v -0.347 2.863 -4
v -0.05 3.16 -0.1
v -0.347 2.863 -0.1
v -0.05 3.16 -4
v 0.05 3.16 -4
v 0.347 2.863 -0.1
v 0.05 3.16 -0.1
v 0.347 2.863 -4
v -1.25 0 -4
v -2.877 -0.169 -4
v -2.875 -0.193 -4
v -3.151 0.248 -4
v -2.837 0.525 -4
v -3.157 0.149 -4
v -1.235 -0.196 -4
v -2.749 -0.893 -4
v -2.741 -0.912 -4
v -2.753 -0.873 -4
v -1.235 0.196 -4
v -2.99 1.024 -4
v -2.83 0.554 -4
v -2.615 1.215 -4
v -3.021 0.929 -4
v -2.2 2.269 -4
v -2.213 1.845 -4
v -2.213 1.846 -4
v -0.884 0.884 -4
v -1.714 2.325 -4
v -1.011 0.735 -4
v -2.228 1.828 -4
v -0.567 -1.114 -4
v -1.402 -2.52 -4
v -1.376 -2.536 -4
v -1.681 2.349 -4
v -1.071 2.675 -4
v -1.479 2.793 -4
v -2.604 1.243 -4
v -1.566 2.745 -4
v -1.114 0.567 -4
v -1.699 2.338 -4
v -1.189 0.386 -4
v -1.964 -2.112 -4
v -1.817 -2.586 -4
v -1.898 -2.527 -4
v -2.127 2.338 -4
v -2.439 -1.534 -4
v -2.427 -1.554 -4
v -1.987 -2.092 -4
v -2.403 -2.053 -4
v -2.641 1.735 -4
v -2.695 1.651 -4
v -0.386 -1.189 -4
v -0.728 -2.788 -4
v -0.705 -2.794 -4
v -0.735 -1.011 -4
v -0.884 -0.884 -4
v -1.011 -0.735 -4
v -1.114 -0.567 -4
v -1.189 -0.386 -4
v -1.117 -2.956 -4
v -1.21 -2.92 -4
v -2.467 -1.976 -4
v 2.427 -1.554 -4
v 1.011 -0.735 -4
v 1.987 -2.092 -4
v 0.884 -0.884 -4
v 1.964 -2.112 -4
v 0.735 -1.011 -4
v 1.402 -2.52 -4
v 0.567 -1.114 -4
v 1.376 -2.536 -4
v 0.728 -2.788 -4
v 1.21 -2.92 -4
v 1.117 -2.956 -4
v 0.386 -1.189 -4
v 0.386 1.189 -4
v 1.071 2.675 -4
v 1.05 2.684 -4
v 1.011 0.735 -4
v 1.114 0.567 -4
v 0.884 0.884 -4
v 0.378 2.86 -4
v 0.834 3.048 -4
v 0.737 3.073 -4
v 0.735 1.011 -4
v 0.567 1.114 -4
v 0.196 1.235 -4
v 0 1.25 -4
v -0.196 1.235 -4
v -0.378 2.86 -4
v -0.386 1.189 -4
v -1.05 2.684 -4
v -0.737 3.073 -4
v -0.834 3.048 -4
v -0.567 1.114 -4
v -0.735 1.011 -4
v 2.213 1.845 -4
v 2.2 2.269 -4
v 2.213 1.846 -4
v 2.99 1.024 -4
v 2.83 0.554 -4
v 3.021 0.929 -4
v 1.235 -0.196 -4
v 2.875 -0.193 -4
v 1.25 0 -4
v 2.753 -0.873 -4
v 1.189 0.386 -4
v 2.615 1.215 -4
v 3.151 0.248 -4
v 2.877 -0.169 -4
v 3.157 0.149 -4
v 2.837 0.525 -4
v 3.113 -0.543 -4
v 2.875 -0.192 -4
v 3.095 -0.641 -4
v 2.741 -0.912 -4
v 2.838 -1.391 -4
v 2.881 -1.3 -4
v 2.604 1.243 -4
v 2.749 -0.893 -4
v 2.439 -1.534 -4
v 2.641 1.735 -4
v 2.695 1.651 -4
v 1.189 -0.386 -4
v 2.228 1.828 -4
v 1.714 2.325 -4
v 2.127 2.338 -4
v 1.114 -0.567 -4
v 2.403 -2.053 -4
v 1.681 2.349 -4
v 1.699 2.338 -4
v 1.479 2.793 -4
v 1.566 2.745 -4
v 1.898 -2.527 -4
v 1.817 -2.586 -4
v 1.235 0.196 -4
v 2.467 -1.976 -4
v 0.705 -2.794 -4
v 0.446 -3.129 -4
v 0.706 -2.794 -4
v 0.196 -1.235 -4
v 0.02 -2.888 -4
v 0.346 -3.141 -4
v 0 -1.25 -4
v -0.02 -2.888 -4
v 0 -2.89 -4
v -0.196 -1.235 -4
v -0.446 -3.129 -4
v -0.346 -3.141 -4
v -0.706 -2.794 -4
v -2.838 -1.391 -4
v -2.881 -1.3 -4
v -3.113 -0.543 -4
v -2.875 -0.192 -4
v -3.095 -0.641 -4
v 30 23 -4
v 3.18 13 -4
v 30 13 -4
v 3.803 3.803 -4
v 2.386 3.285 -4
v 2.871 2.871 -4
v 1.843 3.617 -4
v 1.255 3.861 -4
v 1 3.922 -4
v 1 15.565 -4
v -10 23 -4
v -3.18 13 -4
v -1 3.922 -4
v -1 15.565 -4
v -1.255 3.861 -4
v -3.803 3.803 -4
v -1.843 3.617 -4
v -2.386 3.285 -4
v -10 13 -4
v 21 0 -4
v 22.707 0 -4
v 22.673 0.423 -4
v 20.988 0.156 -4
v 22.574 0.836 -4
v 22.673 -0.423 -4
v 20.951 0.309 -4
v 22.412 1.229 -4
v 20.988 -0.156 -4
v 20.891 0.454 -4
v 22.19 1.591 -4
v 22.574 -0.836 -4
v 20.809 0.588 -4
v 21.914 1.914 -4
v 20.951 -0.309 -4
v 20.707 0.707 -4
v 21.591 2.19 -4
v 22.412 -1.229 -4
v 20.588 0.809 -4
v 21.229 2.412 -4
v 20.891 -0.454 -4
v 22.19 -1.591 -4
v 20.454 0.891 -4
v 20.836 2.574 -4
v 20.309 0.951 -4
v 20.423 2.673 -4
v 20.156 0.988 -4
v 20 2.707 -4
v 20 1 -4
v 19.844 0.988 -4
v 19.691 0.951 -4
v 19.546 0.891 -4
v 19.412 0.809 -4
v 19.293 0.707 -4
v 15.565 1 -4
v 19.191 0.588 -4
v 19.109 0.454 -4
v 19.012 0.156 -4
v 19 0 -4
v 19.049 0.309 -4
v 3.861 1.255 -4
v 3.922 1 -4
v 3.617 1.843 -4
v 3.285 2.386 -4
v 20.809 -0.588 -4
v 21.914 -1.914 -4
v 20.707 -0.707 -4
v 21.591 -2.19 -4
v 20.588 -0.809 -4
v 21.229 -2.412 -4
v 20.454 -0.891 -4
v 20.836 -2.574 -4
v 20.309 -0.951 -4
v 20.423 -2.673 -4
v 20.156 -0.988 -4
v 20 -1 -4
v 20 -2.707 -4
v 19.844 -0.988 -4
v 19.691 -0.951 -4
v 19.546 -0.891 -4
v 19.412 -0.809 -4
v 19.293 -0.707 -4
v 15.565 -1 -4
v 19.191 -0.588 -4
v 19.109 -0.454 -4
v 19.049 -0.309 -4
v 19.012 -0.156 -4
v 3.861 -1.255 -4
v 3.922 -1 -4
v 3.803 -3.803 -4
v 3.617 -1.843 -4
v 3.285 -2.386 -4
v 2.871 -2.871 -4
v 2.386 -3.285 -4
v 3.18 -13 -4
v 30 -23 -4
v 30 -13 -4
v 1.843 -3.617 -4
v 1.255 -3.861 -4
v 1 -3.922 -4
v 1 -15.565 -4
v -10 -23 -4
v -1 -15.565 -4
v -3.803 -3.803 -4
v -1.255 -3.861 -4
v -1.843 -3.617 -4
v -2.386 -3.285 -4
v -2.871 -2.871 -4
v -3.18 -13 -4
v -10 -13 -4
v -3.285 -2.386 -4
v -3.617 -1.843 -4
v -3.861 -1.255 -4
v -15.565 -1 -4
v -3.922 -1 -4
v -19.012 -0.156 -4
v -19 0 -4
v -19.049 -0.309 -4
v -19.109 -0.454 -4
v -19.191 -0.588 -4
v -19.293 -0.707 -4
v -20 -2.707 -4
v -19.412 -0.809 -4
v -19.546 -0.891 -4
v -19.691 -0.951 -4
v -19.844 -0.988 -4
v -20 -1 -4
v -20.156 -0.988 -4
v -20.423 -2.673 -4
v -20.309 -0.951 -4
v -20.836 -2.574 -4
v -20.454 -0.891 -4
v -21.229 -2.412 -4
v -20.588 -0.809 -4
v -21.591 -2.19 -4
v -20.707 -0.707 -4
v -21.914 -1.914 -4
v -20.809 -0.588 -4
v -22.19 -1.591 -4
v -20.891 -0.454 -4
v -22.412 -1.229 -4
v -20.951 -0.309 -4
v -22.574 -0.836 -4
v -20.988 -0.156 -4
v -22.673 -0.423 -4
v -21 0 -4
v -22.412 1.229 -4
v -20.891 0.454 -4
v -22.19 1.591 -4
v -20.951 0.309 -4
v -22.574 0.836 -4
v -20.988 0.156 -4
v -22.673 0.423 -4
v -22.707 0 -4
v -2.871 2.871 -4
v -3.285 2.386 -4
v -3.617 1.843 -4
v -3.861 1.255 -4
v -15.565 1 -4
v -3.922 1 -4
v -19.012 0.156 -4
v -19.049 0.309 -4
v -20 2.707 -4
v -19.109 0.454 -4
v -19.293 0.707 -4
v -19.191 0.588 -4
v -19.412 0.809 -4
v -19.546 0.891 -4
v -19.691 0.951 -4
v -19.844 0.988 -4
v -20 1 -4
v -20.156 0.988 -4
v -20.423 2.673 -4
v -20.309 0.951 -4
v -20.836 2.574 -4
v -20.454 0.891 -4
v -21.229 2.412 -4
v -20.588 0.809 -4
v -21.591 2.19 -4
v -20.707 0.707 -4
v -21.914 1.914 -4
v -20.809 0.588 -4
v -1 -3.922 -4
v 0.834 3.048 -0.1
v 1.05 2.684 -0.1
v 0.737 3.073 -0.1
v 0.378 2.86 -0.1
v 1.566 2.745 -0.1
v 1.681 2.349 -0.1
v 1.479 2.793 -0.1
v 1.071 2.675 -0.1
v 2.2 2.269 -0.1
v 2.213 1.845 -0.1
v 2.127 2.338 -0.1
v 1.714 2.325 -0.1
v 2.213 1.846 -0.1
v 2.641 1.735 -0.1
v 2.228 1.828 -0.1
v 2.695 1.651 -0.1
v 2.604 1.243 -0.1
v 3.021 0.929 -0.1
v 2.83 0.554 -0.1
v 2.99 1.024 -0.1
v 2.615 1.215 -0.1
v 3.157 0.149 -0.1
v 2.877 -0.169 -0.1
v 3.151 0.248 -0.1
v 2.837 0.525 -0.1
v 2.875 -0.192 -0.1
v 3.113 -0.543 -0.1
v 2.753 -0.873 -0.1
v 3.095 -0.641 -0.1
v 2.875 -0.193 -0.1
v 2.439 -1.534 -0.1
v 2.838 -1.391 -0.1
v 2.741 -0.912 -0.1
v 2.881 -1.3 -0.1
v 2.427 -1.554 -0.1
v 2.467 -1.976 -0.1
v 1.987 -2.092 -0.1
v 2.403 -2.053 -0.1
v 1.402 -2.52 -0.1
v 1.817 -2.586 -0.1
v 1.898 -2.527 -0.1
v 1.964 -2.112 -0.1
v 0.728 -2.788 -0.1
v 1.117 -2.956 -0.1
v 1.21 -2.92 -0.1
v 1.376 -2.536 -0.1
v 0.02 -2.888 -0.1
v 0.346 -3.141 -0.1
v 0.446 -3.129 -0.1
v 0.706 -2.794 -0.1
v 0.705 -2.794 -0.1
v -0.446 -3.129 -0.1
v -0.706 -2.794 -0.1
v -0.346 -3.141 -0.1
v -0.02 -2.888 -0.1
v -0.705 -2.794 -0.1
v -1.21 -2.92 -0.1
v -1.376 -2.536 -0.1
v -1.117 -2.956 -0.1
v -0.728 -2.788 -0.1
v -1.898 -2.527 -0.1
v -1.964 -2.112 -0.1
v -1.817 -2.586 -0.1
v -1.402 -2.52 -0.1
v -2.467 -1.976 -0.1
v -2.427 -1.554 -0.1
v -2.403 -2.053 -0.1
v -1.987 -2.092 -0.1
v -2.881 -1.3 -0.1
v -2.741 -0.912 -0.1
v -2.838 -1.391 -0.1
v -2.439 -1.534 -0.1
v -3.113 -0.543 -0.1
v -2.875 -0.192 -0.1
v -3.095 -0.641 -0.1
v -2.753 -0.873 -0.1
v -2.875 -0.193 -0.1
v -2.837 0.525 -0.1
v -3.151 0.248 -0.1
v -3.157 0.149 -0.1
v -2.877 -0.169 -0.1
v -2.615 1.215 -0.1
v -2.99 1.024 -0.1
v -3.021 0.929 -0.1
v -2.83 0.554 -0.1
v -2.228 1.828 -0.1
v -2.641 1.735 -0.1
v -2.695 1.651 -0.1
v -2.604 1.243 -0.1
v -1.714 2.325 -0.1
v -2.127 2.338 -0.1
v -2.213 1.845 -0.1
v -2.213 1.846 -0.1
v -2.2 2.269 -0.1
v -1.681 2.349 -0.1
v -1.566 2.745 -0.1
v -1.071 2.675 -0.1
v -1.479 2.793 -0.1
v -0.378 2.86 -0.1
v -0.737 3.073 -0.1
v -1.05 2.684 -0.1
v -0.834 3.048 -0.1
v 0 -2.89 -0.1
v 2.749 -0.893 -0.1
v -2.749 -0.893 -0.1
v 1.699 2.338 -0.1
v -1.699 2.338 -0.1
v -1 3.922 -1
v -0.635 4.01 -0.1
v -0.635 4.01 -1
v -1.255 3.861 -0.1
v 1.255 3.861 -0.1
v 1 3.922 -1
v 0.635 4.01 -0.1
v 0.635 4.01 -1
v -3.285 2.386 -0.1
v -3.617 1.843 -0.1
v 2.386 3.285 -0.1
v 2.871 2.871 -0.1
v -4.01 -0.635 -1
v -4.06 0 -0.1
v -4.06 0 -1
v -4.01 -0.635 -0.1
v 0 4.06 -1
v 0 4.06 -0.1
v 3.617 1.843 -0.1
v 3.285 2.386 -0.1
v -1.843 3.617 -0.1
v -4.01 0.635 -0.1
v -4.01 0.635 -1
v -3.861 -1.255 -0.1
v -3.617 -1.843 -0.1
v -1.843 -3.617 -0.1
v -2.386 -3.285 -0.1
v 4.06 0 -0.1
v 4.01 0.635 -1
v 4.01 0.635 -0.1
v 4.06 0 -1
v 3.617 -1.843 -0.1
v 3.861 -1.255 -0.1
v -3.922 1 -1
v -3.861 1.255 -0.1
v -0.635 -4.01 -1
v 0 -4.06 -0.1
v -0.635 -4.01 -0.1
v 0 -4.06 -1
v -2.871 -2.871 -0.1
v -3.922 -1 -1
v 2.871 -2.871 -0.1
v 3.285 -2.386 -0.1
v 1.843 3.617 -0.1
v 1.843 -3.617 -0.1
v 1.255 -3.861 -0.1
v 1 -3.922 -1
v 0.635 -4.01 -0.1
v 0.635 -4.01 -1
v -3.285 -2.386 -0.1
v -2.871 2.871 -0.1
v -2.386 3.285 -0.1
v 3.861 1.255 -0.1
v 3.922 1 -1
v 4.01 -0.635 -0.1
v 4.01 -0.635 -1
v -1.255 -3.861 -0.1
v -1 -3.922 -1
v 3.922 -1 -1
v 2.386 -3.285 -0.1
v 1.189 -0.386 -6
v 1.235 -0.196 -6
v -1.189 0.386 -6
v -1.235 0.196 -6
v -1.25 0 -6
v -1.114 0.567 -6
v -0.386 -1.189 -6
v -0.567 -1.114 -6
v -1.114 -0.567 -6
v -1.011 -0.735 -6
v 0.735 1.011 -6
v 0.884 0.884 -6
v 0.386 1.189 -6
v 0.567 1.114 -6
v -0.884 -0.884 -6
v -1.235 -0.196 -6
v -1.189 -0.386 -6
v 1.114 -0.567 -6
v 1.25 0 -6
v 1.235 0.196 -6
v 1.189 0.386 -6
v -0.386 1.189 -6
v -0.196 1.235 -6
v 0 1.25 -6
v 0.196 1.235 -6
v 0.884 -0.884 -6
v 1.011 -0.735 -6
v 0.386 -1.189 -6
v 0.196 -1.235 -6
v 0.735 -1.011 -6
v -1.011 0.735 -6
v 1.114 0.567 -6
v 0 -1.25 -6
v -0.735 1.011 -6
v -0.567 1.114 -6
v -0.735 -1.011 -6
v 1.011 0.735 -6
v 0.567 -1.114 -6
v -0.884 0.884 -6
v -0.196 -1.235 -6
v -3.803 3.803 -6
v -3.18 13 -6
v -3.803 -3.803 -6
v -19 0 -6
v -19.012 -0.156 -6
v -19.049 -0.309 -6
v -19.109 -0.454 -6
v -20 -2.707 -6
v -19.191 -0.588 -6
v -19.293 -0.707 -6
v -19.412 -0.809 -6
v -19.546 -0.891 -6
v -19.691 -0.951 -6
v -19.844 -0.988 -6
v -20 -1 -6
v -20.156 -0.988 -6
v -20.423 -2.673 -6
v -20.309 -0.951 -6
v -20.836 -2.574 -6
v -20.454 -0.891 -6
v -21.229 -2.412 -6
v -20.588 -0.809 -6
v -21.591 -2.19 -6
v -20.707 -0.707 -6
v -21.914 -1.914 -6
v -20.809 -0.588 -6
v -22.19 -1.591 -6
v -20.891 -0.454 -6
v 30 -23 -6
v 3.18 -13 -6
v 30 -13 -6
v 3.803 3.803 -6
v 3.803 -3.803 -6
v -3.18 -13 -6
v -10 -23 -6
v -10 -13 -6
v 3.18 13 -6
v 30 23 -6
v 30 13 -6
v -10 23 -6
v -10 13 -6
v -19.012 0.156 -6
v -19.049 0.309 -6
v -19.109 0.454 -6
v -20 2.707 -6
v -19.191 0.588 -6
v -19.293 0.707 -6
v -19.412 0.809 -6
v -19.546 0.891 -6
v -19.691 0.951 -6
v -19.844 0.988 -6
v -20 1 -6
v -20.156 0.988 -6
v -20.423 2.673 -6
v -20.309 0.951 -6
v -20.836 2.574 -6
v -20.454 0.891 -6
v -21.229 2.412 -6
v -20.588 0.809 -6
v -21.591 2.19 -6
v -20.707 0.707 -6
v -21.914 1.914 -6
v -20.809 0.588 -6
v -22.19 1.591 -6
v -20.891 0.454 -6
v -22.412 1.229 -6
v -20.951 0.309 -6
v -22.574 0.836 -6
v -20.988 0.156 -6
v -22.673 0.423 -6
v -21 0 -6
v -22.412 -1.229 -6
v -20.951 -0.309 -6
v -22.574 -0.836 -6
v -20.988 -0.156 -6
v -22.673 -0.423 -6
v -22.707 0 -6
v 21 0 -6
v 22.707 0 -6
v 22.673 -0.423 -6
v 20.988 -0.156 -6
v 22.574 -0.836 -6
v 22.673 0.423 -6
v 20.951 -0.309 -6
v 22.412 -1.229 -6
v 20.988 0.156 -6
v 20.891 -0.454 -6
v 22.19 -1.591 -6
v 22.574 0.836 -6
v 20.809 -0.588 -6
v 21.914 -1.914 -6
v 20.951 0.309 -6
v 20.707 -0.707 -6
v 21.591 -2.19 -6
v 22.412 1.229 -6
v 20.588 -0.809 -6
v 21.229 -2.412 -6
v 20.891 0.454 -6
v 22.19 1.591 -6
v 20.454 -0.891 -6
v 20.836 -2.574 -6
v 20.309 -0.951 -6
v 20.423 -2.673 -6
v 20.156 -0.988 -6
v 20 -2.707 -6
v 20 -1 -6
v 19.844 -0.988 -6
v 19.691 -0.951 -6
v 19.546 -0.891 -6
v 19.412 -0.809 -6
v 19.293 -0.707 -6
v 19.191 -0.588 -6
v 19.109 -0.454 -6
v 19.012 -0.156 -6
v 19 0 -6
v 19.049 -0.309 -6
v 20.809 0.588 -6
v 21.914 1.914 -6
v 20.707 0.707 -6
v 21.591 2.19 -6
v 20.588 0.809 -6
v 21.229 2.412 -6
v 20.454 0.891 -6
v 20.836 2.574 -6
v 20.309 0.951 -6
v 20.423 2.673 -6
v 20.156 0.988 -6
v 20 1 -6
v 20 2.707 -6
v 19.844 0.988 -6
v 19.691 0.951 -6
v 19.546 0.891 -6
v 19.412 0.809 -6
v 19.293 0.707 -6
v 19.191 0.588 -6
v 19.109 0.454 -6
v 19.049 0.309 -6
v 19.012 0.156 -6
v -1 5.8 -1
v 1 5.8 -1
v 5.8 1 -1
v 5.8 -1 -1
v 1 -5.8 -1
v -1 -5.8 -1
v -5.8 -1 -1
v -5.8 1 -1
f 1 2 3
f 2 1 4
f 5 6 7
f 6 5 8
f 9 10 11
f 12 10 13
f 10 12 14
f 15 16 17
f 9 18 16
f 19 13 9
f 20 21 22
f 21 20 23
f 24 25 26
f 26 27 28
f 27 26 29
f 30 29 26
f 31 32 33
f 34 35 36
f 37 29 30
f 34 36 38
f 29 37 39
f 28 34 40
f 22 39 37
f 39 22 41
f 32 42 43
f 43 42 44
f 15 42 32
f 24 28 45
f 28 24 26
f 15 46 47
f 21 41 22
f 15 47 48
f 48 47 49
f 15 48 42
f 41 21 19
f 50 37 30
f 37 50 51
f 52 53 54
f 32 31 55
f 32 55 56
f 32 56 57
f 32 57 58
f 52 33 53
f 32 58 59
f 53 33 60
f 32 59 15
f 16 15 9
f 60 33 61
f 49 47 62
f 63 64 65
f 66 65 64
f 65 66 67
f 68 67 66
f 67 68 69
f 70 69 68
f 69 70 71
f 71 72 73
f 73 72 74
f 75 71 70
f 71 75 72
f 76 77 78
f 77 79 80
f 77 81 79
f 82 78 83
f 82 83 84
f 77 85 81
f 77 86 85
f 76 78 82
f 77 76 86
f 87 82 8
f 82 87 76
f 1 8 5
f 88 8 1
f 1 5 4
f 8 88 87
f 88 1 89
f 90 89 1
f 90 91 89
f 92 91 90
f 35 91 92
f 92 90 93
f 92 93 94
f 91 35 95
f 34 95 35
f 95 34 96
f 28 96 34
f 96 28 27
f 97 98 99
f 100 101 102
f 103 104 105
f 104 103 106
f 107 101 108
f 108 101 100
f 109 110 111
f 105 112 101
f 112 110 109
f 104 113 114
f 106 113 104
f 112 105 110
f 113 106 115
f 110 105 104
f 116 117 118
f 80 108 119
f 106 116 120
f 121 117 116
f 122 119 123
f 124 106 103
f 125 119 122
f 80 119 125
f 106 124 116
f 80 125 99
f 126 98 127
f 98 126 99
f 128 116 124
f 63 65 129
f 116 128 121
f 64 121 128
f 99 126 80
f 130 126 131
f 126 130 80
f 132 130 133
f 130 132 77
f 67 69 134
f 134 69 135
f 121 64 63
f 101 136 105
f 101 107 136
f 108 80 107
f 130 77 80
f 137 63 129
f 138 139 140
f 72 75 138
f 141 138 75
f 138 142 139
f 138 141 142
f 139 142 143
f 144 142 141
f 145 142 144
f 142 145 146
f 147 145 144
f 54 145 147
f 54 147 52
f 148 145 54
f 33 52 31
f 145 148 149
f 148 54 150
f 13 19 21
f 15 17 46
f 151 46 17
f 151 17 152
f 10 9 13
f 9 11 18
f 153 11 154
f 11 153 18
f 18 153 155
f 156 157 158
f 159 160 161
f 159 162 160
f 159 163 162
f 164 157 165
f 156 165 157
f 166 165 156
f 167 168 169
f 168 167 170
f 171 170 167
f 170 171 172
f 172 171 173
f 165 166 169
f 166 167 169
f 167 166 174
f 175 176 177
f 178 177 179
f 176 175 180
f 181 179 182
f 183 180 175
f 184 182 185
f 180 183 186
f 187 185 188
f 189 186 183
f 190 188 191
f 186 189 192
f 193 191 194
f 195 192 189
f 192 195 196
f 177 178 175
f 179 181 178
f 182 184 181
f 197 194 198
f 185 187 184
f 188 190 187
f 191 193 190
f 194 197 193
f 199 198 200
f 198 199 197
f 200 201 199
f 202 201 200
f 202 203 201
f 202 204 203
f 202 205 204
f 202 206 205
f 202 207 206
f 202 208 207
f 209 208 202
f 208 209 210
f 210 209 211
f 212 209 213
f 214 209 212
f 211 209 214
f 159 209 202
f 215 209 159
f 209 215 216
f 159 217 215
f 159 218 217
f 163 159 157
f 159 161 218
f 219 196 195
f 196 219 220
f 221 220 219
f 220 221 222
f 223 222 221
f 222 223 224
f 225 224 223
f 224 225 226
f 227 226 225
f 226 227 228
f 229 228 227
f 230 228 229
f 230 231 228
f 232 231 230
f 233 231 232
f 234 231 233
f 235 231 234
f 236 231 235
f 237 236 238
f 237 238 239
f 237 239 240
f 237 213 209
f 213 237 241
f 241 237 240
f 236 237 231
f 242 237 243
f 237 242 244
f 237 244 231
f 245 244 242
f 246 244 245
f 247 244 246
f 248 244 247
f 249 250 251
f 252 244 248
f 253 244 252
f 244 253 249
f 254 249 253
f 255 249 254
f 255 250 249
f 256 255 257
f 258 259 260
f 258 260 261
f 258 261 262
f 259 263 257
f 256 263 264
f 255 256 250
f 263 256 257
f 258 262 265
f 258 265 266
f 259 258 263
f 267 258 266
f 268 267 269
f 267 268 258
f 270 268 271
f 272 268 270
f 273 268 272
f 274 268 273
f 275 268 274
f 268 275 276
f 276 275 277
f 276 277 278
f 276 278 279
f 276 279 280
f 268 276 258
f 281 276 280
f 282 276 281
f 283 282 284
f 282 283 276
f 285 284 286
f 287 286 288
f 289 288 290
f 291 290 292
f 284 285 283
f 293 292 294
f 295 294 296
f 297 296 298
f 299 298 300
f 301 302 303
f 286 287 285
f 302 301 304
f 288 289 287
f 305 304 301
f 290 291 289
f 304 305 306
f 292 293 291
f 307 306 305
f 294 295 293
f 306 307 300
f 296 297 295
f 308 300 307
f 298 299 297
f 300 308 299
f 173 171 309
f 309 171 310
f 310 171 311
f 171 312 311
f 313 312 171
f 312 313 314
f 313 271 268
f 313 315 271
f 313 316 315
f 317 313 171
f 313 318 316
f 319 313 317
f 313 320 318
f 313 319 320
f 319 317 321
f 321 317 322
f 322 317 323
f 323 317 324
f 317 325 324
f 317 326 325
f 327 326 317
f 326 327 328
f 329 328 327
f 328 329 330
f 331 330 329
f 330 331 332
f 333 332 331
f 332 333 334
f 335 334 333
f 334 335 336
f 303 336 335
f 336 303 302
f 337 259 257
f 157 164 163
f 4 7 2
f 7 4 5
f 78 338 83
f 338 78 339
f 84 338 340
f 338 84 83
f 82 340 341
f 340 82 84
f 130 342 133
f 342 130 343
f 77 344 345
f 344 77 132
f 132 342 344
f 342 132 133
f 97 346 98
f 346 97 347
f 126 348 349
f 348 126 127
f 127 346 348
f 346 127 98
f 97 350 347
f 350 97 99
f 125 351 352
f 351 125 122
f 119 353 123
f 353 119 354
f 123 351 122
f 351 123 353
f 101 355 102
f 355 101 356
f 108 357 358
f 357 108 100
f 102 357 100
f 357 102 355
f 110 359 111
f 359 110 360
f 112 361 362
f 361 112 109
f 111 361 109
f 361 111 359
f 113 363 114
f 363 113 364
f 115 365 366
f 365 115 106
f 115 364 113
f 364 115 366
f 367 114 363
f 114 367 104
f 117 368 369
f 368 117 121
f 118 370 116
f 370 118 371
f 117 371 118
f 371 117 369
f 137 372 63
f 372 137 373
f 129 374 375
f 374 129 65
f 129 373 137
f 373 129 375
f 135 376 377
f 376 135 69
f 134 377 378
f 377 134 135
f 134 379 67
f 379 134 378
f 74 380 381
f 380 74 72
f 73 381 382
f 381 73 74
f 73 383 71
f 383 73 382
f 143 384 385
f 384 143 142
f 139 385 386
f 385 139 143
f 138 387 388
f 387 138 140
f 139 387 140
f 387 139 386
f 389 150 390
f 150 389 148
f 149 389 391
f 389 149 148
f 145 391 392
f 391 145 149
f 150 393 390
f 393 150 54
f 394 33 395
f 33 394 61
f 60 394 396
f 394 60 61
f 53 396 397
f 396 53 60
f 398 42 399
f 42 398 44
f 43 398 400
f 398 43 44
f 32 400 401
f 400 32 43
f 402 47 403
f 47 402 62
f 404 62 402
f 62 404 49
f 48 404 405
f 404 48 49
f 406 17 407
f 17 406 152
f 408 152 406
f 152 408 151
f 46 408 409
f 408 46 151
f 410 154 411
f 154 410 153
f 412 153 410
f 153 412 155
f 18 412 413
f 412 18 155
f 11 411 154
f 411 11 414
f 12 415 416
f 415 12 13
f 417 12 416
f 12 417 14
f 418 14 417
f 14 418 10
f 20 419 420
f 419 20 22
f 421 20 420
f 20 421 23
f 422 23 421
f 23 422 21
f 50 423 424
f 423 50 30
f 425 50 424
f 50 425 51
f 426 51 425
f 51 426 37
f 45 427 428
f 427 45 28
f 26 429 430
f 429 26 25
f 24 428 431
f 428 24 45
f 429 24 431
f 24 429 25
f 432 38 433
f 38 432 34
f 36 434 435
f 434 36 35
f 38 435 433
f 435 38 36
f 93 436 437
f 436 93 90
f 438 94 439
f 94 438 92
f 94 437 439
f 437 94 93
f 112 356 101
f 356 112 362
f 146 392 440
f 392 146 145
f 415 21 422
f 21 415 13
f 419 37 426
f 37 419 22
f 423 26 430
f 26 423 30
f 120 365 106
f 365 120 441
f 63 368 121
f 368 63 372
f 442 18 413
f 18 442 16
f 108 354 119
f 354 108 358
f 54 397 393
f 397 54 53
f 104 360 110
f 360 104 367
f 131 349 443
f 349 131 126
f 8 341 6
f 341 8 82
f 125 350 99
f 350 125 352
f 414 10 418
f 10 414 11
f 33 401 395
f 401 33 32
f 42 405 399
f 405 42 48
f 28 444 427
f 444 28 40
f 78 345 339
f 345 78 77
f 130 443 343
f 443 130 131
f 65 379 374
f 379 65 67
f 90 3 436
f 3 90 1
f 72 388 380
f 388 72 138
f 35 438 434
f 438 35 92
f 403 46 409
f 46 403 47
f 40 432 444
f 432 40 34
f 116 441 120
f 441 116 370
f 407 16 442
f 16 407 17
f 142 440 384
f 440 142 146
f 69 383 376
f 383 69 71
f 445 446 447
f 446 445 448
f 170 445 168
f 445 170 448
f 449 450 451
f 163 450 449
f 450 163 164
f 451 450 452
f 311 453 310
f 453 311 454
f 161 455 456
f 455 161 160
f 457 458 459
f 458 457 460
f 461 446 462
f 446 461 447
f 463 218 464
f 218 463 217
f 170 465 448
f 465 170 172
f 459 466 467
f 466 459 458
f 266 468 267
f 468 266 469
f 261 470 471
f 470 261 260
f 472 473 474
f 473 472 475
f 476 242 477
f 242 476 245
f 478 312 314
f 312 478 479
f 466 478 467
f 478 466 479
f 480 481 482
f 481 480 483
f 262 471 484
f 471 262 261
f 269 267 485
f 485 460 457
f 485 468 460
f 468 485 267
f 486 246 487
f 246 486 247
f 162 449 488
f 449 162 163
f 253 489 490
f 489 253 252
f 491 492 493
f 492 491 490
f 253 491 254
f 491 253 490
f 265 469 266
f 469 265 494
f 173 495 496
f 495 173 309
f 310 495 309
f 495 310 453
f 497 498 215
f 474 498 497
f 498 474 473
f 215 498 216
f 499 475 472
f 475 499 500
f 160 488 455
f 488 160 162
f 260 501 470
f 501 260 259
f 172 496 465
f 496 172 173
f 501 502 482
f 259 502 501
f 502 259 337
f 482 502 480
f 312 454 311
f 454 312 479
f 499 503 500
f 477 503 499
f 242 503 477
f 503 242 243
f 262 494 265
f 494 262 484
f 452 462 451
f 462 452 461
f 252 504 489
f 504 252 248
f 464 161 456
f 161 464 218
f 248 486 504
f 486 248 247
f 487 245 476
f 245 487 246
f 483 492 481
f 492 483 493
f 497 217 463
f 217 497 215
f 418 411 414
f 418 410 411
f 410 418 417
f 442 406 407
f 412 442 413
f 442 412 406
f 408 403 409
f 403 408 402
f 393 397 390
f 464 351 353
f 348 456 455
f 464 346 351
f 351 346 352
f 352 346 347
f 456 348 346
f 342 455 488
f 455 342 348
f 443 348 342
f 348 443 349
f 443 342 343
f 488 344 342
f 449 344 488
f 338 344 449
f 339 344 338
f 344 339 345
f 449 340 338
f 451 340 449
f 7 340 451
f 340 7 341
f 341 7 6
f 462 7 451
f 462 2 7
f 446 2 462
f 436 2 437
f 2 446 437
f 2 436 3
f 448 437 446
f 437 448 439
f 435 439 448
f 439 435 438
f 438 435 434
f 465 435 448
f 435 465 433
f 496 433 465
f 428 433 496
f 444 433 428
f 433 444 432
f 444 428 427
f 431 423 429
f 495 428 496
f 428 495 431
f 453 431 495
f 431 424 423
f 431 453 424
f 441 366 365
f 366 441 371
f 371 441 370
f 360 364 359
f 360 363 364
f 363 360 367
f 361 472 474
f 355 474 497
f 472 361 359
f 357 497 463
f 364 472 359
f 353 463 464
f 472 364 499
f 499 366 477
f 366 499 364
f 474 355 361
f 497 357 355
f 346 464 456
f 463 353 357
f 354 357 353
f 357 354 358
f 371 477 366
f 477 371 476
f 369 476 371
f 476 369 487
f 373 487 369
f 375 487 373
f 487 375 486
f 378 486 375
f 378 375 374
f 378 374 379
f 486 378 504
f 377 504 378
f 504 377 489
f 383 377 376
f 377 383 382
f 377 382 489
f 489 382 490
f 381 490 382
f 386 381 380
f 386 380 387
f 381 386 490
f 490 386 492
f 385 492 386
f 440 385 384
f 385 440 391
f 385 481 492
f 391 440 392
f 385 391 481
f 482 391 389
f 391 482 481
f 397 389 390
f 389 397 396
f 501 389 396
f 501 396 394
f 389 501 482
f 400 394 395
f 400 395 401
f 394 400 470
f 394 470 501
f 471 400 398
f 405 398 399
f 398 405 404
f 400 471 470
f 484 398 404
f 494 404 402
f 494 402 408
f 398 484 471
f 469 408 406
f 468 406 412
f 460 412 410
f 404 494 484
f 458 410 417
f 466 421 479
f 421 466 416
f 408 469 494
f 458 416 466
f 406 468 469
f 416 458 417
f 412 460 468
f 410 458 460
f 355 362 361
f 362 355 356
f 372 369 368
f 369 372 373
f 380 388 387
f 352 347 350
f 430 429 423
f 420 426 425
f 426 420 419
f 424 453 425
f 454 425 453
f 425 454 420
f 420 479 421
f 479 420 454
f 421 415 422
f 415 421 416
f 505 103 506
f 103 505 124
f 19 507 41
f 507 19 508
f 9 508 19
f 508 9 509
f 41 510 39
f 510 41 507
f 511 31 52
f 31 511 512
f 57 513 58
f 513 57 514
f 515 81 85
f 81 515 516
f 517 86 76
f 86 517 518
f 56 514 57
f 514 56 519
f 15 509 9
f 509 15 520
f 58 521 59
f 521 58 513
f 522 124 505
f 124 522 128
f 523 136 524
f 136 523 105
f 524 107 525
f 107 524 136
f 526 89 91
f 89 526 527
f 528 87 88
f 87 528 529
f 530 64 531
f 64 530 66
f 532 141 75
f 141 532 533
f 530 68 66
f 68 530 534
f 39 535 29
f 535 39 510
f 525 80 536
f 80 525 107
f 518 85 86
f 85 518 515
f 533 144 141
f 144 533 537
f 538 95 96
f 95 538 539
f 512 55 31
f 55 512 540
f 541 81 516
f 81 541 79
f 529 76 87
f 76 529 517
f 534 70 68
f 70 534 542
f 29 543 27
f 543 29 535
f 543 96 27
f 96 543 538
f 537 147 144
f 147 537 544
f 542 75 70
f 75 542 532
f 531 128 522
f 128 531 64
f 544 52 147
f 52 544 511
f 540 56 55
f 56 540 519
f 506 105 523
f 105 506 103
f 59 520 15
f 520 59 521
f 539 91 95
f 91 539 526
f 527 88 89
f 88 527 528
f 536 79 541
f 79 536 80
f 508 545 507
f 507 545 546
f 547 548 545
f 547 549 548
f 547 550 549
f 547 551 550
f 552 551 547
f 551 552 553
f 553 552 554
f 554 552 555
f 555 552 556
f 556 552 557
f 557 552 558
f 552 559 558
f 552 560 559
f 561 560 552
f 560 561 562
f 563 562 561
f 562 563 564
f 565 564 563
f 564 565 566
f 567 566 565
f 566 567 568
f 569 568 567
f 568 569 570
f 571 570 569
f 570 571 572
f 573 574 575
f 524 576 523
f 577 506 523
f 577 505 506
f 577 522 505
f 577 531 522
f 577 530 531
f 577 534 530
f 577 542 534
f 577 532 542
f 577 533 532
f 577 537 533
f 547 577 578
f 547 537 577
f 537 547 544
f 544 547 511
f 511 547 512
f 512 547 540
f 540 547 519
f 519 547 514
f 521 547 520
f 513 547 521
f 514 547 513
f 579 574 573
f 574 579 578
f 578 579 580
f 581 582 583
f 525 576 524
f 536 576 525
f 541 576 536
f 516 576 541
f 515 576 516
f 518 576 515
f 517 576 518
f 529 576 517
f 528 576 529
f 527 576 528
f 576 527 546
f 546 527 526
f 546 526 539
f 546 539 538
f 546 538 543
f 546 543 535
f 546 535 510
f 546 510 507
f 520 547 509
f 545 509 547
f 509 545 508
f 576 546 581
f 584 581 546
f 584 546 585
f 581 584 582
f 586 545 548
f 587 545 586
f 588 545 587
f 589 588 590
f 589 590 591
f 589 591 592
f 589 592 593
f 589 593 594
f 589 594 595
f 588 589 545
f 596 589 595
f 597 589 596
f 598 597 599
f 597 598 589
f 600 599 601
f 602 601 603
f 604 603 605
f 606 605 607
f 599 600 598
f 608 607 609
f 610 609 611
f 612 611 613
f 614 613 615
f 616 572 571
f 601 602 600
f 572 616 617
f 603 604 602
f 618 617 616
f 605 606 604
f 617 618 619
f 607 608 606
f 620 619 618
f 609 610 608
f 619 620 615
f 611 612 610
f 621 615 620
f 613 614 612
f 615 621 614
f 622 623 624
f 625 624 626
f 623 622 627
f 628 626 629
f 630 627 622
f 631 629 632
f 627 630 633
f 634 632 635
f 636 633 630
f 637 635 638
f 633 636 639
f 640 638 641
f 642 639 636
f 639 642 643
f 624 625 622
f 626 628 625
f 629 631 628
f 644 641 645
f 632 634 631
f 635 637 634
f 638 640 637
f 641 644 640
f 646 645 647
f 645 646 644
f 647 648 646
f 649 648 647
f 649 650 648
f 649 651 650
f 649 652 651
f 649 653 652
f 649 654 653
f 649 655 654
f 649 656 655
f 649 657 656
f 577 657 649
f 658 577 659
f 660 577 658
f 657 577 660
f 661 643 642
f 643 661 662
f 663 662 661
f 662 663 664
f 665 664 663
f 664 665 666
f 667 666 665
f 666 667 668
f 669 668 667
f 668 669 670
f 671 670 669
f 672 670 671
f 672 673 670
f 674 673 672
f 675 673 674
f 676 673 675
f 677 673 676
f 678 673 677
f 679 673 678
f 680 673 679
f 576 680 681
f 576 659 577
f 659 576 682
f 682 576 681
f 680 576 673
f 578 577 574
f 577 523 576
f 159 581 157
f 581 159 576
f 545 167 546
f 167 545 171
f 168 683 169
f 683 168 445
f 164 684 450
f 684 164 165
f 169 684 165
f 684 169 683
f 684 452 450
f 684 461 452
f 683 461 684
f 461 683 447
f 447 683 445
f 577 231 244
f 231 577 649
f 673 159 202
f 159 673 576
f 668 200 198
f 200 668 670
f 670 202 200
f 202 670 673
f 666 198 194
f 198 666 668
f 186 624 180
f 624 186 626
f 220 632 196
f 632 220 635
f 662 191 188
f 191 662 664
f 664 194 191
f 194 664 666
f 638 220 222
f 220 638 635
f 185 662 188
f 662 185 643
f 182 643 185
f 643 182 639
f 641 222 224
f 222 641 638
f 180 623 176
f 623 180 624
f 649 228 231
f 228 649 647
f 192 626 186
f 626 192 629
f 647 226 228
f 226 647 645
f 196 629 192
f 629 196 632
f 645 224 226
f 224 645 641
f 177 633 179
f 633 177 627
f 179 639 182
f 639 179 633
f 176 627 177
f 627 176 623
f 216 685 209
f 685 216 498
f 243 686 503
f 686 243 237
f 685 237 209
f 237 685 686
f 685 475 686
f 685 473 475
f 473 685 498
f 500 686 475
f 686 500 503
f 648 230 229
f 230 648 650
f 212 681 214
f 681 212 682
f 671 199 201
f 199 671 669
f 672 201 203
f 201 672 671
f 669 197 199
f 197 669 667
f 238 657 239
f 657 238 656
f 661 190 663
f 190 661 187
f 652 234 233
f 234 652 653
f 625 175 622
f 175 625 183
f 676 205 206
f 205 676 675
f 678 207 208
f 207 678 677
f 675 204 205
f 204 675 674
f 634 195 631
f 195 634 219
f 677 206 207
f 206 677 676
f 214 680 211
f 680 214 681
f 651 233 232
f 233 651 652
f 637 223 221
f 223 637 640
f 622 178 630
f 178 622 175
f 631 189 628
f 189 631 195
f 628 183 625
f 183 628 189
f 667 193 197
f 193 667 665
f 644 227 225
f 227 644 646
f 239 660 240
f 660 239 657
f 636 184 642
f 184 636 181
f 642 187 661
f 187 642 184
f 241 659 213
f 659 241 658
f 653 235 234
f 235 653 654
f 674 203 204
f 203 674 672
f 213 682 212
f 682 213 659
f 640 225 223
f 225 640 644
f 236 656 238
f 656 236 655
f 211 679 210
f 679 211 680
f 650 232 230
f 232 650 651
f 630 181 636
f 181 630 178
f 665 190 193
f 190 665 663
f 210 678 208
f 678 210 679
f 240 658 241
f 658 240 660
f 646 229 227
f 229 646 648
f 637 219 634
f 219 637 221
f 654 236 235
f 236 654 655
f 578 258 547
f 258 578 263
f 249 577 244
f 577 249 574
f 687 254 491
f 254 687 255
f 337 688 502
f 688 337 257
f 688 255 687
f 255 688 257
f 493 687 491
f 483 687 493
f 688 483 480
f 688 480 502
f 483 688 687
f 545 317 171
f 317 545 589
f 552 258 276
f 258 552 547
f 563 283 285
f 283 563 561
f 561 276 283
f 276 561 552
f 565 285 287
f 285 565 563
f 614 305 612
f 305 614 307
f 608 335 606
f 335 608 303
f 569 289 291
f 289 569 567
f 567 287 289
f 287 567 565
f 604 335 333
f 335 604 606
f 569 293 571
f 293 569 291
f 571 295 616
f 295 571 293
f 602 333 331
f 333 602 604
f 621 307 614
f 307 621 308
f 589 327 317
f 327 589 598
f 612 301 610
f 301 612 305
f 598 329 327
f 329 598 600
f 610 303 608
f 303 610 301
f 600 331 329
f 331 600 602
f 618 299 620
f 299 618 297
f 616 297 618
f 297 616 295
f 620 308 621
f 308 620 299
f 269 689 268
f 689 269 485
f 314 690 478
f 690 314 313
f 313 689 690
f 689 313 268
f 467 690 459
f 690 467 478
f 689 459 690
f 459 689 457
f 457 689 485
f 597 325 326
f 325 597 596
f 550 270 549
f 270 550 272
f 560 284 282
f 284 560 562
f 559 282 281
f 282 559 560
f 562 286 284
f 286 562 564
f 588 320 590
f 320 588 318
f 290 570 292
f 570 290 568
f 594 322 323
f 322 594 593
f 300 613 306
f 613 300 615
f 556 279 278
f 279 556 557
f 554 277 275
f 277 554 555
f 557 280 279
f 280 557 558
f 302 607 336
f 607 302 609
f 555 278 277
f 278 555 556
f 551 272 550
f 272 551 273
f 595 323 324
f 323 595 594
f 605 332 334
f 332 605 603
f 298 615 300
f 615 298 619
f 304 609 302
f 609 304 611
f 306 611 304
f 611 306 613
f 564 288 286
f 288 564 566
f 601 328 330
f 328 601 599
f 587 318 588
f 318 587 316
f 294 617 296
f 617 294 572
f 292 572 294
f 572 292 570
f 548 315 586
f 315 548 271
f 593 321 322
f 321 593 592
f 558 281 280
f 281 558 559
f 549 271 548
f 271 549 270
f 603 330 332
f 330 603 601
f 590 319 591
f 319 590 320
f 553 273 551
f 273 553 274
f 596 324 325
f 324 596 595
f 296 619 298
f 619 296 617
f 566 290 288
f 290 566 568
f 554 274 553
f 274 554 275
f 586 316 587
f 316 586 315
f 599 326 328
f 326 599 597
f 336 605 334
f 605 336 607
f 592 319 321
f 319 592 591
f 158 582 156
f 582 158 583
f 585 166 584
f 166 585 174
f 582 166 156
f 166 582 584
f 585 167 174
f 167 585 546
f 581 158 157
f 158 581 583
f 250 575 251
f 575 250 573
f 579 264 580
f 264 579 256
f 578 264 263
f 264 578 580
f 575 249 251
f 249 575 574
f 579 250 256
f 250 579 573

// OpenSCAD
/**
 *  Parametric servo arm generator for OpenScad
 *  Générateur de palonnier de servo pour OpenScad
 *
 *  Copyright (c) 2012 Charles Rincheval.  All rights reserved.
 *
 *  This library is free software; you can redistribute it and/or
 *  modify it under the terms of the GNU Lesser General Public
 *  License as published by the Free Software Foundation; either
 *  version 2.1 of the License, or (at your option) any later version.
 *
 *  This library is distributed in the hope that it will be useful,
 *  but WITHOUT ANY WARRANTY; without even the implied warranty of
 *  MERCHANTABILITY or FITNESS FOR A PARTICULAR PURPOSE.  See the GNU
 *  Lesser General Public License for more details.
 *
 *  You should have received a copy of the GNU Lesser General Public
 *  License along with this library; if not, write to the Free Software
 *  Foundation, Inc., 51 Franklin St, Fifth Floor, Boston, MA  02110-1301  USA
 *
 *  Last update :
 *  https://github.com/hugokernel/OpenSCAD_ServoArms
 *
 *  http://www.digitalspirit.org/
 */

$fn = 40;

/**
 *  Clear between arm head and servo head
 *  With PLA material, use clear : 0.3, for ABS, use 0.2
 */
SERVO_HEAD_CLEAR = 0.2;

/**
 *  Head / Tooth parameters
 *  Futaba 3F Standard Spline
 *  http://www.servocity.com/html/futaba_servo_splines.html
 *
 *  First array (head related) :
 *  0. Head external diameter
 *  1. Head heigth
 *  2. Head thickness
 *  3. Head screw diameter
 *
 *  Second array (tooth related) :
 *  0. Tooth count
 *  1. Tooth height
 *  2. Tooth length
 *  3. Tooth width
 */
FUTABA_3F_SPLINE = [
    [5.92, 4, 1.1, 2.5],
    [25, 0.3, 0.7, 0.1]
];

module servo_futaba_3f(length, count) {
    servo_arm(FUTABA_3F_SPLINE, [length, count]);
}

/**
 *  If you want to support a new servo, juste add a new spline definition array
 *  and a module named like servo_XXX_YYY where XXX is servo brand and YYY is the
 *  connection type (3f) or the servo type (s3003)
 */

module servo_standard(length, count) {
    servo_futaba_3f(length, count);
}

/**
 *  Tooth
 *
 *    |<-w->|
 *    |_____|___
 *    /     \  ^h
 *  _/       \_v
 *   |<--l-->|
 *
 *  - tooth length (l)
 *  - tooth width (w)
 *  - tooth height (h)
 *  - height
 *
 */
module servo_head_tooth(length, width, height, head_height) {
    linear_extrude(height = head_height) {
        polygon([[-length / 2, 0], [-width / 2, height], [width / 2, height], [length / 2,0]]);
    }
}

/**
 *  Servo head
 */
module servo_head(params, clear = SERVO_HEAD_CLEAR) {

    head = params[0];
    tooth = params[1];

    head_diameter = head[0];
    head_heigth = head[1];

    tooth_count = tooth[0];
    tooth_height = tooth[1];
    tooth_length = tooth[2];
    tooth_width = tooth[3];

    % cylinder(r = head_diameter / 2, h = head_heigth + 1);

    cylinder(r = head_diameter / 2 - tooth_height + 0.03 + clear, h = head_heigth);

    for (i = [0 : tooth_count]) {
        rotate([0, 0, i * (360 / tooth_count)]) {
            translate([0, head_diameter / 2 - tooth_height + clear, 0]) {
                servo_head_tooth(tooth_length, tooth_width, tooth_height, head_heigth);
            }
        }
    }
}

/**
 *  Servo hold
 *  - Head / Tooth parameters
 *  - Arms params (length and count)
 */




module servo_arm(params, arms) {

    head = params[0];
    tooth = params[1];

    head_diameter = head[0];
    head_heigth = head[1];
    head_thickness = head[2];
    head_screw_diameter = head[3];

    tooth_length = tooth[2];
    tooth_width = tooth[3];

    arm_length = arms[0];
    arm_count = arms[1];

    /**
     *  Servo arm
     *  - length is from center to last hole
     */
    module arm(tooth_length, tooth_width, head_height, head_heigth, hole_count = 1) {

        arm_screw_diameter = 2;

        difference() {
            union() {
                cylinder(r = tooth_width / 2, h = head_heigth);

                linear_extrude(height = head_heigth) {
                    polygon([
                        [-tooth_width / 2, 0], [-tooth_width / 3, tooth_length],
                        [tooth_width / 3, tooth_length], [tooth_width / 2, 0]
                    ]);
                }

                translate([0, tooth_length, 0]) {
                    cylinder(r = tooth_width / 3, h = head_heigth);
                }

                if (tooth_length >= 12) {
                    translate([-head_heigth / 2 + 2, 3.8, -4]) {
                        rotate([90, 0, 0]) {
                            rotate([0, -90, 0]) {
                                linear_extrude(height = head_heigth) {
                                    polygon([
                                        [-tooth_length / 1.7, 4], [0, 4], [0, - head_height + 5],
                                        [-2, - head_height + 5]
                                    ]);
                                }
                            }
                        }
                    }
                }
            }

            // Hole
            for (i = [0 : hole_count - 1]) {
                //translate([0, length - (length / hole_count * i), -1]) {
                translate([0, tooth_length - (4 * i), -1]) {
                    cylinder(r = arm_screw_diameter / 2, h = 10);
                }
            }

            cylinder(r = head_screw_diameter / 2, h = 10);
        }
    }

    difference() {
        translate([0, 0, 0.1]) {
            cylinder(r = head_diameter / 2 + head_thickness, h = head_heigth + 1);
        }

        cylinder(r = head_screw_diameter / 2, h = 10);

        servo_head(params);
    }

    arm_thickness = head_thickness;

    // Arm
    translate([0, 0, head_heigth]) {
        for (i = [0 : arm_count - 1]) {
            rotate([0, 0, i * (360 / arm_count)]) {
                arm(arm_length, head_diameter + arm_thickness * 2, head_heigth, 2);
            }
        }
    }
}

module leg1() {
    translate([-10, 13, -6])
        cube([40, 10, 2], false);
}

module leg2() {
    translate([-10, -23, -6])
        cube([40, 10, 2], false);
}

module demo() {
    rotate([0, 180, 0])
        servo_standard(20, 4);
        leg1();
        leg2();
}

demo();
